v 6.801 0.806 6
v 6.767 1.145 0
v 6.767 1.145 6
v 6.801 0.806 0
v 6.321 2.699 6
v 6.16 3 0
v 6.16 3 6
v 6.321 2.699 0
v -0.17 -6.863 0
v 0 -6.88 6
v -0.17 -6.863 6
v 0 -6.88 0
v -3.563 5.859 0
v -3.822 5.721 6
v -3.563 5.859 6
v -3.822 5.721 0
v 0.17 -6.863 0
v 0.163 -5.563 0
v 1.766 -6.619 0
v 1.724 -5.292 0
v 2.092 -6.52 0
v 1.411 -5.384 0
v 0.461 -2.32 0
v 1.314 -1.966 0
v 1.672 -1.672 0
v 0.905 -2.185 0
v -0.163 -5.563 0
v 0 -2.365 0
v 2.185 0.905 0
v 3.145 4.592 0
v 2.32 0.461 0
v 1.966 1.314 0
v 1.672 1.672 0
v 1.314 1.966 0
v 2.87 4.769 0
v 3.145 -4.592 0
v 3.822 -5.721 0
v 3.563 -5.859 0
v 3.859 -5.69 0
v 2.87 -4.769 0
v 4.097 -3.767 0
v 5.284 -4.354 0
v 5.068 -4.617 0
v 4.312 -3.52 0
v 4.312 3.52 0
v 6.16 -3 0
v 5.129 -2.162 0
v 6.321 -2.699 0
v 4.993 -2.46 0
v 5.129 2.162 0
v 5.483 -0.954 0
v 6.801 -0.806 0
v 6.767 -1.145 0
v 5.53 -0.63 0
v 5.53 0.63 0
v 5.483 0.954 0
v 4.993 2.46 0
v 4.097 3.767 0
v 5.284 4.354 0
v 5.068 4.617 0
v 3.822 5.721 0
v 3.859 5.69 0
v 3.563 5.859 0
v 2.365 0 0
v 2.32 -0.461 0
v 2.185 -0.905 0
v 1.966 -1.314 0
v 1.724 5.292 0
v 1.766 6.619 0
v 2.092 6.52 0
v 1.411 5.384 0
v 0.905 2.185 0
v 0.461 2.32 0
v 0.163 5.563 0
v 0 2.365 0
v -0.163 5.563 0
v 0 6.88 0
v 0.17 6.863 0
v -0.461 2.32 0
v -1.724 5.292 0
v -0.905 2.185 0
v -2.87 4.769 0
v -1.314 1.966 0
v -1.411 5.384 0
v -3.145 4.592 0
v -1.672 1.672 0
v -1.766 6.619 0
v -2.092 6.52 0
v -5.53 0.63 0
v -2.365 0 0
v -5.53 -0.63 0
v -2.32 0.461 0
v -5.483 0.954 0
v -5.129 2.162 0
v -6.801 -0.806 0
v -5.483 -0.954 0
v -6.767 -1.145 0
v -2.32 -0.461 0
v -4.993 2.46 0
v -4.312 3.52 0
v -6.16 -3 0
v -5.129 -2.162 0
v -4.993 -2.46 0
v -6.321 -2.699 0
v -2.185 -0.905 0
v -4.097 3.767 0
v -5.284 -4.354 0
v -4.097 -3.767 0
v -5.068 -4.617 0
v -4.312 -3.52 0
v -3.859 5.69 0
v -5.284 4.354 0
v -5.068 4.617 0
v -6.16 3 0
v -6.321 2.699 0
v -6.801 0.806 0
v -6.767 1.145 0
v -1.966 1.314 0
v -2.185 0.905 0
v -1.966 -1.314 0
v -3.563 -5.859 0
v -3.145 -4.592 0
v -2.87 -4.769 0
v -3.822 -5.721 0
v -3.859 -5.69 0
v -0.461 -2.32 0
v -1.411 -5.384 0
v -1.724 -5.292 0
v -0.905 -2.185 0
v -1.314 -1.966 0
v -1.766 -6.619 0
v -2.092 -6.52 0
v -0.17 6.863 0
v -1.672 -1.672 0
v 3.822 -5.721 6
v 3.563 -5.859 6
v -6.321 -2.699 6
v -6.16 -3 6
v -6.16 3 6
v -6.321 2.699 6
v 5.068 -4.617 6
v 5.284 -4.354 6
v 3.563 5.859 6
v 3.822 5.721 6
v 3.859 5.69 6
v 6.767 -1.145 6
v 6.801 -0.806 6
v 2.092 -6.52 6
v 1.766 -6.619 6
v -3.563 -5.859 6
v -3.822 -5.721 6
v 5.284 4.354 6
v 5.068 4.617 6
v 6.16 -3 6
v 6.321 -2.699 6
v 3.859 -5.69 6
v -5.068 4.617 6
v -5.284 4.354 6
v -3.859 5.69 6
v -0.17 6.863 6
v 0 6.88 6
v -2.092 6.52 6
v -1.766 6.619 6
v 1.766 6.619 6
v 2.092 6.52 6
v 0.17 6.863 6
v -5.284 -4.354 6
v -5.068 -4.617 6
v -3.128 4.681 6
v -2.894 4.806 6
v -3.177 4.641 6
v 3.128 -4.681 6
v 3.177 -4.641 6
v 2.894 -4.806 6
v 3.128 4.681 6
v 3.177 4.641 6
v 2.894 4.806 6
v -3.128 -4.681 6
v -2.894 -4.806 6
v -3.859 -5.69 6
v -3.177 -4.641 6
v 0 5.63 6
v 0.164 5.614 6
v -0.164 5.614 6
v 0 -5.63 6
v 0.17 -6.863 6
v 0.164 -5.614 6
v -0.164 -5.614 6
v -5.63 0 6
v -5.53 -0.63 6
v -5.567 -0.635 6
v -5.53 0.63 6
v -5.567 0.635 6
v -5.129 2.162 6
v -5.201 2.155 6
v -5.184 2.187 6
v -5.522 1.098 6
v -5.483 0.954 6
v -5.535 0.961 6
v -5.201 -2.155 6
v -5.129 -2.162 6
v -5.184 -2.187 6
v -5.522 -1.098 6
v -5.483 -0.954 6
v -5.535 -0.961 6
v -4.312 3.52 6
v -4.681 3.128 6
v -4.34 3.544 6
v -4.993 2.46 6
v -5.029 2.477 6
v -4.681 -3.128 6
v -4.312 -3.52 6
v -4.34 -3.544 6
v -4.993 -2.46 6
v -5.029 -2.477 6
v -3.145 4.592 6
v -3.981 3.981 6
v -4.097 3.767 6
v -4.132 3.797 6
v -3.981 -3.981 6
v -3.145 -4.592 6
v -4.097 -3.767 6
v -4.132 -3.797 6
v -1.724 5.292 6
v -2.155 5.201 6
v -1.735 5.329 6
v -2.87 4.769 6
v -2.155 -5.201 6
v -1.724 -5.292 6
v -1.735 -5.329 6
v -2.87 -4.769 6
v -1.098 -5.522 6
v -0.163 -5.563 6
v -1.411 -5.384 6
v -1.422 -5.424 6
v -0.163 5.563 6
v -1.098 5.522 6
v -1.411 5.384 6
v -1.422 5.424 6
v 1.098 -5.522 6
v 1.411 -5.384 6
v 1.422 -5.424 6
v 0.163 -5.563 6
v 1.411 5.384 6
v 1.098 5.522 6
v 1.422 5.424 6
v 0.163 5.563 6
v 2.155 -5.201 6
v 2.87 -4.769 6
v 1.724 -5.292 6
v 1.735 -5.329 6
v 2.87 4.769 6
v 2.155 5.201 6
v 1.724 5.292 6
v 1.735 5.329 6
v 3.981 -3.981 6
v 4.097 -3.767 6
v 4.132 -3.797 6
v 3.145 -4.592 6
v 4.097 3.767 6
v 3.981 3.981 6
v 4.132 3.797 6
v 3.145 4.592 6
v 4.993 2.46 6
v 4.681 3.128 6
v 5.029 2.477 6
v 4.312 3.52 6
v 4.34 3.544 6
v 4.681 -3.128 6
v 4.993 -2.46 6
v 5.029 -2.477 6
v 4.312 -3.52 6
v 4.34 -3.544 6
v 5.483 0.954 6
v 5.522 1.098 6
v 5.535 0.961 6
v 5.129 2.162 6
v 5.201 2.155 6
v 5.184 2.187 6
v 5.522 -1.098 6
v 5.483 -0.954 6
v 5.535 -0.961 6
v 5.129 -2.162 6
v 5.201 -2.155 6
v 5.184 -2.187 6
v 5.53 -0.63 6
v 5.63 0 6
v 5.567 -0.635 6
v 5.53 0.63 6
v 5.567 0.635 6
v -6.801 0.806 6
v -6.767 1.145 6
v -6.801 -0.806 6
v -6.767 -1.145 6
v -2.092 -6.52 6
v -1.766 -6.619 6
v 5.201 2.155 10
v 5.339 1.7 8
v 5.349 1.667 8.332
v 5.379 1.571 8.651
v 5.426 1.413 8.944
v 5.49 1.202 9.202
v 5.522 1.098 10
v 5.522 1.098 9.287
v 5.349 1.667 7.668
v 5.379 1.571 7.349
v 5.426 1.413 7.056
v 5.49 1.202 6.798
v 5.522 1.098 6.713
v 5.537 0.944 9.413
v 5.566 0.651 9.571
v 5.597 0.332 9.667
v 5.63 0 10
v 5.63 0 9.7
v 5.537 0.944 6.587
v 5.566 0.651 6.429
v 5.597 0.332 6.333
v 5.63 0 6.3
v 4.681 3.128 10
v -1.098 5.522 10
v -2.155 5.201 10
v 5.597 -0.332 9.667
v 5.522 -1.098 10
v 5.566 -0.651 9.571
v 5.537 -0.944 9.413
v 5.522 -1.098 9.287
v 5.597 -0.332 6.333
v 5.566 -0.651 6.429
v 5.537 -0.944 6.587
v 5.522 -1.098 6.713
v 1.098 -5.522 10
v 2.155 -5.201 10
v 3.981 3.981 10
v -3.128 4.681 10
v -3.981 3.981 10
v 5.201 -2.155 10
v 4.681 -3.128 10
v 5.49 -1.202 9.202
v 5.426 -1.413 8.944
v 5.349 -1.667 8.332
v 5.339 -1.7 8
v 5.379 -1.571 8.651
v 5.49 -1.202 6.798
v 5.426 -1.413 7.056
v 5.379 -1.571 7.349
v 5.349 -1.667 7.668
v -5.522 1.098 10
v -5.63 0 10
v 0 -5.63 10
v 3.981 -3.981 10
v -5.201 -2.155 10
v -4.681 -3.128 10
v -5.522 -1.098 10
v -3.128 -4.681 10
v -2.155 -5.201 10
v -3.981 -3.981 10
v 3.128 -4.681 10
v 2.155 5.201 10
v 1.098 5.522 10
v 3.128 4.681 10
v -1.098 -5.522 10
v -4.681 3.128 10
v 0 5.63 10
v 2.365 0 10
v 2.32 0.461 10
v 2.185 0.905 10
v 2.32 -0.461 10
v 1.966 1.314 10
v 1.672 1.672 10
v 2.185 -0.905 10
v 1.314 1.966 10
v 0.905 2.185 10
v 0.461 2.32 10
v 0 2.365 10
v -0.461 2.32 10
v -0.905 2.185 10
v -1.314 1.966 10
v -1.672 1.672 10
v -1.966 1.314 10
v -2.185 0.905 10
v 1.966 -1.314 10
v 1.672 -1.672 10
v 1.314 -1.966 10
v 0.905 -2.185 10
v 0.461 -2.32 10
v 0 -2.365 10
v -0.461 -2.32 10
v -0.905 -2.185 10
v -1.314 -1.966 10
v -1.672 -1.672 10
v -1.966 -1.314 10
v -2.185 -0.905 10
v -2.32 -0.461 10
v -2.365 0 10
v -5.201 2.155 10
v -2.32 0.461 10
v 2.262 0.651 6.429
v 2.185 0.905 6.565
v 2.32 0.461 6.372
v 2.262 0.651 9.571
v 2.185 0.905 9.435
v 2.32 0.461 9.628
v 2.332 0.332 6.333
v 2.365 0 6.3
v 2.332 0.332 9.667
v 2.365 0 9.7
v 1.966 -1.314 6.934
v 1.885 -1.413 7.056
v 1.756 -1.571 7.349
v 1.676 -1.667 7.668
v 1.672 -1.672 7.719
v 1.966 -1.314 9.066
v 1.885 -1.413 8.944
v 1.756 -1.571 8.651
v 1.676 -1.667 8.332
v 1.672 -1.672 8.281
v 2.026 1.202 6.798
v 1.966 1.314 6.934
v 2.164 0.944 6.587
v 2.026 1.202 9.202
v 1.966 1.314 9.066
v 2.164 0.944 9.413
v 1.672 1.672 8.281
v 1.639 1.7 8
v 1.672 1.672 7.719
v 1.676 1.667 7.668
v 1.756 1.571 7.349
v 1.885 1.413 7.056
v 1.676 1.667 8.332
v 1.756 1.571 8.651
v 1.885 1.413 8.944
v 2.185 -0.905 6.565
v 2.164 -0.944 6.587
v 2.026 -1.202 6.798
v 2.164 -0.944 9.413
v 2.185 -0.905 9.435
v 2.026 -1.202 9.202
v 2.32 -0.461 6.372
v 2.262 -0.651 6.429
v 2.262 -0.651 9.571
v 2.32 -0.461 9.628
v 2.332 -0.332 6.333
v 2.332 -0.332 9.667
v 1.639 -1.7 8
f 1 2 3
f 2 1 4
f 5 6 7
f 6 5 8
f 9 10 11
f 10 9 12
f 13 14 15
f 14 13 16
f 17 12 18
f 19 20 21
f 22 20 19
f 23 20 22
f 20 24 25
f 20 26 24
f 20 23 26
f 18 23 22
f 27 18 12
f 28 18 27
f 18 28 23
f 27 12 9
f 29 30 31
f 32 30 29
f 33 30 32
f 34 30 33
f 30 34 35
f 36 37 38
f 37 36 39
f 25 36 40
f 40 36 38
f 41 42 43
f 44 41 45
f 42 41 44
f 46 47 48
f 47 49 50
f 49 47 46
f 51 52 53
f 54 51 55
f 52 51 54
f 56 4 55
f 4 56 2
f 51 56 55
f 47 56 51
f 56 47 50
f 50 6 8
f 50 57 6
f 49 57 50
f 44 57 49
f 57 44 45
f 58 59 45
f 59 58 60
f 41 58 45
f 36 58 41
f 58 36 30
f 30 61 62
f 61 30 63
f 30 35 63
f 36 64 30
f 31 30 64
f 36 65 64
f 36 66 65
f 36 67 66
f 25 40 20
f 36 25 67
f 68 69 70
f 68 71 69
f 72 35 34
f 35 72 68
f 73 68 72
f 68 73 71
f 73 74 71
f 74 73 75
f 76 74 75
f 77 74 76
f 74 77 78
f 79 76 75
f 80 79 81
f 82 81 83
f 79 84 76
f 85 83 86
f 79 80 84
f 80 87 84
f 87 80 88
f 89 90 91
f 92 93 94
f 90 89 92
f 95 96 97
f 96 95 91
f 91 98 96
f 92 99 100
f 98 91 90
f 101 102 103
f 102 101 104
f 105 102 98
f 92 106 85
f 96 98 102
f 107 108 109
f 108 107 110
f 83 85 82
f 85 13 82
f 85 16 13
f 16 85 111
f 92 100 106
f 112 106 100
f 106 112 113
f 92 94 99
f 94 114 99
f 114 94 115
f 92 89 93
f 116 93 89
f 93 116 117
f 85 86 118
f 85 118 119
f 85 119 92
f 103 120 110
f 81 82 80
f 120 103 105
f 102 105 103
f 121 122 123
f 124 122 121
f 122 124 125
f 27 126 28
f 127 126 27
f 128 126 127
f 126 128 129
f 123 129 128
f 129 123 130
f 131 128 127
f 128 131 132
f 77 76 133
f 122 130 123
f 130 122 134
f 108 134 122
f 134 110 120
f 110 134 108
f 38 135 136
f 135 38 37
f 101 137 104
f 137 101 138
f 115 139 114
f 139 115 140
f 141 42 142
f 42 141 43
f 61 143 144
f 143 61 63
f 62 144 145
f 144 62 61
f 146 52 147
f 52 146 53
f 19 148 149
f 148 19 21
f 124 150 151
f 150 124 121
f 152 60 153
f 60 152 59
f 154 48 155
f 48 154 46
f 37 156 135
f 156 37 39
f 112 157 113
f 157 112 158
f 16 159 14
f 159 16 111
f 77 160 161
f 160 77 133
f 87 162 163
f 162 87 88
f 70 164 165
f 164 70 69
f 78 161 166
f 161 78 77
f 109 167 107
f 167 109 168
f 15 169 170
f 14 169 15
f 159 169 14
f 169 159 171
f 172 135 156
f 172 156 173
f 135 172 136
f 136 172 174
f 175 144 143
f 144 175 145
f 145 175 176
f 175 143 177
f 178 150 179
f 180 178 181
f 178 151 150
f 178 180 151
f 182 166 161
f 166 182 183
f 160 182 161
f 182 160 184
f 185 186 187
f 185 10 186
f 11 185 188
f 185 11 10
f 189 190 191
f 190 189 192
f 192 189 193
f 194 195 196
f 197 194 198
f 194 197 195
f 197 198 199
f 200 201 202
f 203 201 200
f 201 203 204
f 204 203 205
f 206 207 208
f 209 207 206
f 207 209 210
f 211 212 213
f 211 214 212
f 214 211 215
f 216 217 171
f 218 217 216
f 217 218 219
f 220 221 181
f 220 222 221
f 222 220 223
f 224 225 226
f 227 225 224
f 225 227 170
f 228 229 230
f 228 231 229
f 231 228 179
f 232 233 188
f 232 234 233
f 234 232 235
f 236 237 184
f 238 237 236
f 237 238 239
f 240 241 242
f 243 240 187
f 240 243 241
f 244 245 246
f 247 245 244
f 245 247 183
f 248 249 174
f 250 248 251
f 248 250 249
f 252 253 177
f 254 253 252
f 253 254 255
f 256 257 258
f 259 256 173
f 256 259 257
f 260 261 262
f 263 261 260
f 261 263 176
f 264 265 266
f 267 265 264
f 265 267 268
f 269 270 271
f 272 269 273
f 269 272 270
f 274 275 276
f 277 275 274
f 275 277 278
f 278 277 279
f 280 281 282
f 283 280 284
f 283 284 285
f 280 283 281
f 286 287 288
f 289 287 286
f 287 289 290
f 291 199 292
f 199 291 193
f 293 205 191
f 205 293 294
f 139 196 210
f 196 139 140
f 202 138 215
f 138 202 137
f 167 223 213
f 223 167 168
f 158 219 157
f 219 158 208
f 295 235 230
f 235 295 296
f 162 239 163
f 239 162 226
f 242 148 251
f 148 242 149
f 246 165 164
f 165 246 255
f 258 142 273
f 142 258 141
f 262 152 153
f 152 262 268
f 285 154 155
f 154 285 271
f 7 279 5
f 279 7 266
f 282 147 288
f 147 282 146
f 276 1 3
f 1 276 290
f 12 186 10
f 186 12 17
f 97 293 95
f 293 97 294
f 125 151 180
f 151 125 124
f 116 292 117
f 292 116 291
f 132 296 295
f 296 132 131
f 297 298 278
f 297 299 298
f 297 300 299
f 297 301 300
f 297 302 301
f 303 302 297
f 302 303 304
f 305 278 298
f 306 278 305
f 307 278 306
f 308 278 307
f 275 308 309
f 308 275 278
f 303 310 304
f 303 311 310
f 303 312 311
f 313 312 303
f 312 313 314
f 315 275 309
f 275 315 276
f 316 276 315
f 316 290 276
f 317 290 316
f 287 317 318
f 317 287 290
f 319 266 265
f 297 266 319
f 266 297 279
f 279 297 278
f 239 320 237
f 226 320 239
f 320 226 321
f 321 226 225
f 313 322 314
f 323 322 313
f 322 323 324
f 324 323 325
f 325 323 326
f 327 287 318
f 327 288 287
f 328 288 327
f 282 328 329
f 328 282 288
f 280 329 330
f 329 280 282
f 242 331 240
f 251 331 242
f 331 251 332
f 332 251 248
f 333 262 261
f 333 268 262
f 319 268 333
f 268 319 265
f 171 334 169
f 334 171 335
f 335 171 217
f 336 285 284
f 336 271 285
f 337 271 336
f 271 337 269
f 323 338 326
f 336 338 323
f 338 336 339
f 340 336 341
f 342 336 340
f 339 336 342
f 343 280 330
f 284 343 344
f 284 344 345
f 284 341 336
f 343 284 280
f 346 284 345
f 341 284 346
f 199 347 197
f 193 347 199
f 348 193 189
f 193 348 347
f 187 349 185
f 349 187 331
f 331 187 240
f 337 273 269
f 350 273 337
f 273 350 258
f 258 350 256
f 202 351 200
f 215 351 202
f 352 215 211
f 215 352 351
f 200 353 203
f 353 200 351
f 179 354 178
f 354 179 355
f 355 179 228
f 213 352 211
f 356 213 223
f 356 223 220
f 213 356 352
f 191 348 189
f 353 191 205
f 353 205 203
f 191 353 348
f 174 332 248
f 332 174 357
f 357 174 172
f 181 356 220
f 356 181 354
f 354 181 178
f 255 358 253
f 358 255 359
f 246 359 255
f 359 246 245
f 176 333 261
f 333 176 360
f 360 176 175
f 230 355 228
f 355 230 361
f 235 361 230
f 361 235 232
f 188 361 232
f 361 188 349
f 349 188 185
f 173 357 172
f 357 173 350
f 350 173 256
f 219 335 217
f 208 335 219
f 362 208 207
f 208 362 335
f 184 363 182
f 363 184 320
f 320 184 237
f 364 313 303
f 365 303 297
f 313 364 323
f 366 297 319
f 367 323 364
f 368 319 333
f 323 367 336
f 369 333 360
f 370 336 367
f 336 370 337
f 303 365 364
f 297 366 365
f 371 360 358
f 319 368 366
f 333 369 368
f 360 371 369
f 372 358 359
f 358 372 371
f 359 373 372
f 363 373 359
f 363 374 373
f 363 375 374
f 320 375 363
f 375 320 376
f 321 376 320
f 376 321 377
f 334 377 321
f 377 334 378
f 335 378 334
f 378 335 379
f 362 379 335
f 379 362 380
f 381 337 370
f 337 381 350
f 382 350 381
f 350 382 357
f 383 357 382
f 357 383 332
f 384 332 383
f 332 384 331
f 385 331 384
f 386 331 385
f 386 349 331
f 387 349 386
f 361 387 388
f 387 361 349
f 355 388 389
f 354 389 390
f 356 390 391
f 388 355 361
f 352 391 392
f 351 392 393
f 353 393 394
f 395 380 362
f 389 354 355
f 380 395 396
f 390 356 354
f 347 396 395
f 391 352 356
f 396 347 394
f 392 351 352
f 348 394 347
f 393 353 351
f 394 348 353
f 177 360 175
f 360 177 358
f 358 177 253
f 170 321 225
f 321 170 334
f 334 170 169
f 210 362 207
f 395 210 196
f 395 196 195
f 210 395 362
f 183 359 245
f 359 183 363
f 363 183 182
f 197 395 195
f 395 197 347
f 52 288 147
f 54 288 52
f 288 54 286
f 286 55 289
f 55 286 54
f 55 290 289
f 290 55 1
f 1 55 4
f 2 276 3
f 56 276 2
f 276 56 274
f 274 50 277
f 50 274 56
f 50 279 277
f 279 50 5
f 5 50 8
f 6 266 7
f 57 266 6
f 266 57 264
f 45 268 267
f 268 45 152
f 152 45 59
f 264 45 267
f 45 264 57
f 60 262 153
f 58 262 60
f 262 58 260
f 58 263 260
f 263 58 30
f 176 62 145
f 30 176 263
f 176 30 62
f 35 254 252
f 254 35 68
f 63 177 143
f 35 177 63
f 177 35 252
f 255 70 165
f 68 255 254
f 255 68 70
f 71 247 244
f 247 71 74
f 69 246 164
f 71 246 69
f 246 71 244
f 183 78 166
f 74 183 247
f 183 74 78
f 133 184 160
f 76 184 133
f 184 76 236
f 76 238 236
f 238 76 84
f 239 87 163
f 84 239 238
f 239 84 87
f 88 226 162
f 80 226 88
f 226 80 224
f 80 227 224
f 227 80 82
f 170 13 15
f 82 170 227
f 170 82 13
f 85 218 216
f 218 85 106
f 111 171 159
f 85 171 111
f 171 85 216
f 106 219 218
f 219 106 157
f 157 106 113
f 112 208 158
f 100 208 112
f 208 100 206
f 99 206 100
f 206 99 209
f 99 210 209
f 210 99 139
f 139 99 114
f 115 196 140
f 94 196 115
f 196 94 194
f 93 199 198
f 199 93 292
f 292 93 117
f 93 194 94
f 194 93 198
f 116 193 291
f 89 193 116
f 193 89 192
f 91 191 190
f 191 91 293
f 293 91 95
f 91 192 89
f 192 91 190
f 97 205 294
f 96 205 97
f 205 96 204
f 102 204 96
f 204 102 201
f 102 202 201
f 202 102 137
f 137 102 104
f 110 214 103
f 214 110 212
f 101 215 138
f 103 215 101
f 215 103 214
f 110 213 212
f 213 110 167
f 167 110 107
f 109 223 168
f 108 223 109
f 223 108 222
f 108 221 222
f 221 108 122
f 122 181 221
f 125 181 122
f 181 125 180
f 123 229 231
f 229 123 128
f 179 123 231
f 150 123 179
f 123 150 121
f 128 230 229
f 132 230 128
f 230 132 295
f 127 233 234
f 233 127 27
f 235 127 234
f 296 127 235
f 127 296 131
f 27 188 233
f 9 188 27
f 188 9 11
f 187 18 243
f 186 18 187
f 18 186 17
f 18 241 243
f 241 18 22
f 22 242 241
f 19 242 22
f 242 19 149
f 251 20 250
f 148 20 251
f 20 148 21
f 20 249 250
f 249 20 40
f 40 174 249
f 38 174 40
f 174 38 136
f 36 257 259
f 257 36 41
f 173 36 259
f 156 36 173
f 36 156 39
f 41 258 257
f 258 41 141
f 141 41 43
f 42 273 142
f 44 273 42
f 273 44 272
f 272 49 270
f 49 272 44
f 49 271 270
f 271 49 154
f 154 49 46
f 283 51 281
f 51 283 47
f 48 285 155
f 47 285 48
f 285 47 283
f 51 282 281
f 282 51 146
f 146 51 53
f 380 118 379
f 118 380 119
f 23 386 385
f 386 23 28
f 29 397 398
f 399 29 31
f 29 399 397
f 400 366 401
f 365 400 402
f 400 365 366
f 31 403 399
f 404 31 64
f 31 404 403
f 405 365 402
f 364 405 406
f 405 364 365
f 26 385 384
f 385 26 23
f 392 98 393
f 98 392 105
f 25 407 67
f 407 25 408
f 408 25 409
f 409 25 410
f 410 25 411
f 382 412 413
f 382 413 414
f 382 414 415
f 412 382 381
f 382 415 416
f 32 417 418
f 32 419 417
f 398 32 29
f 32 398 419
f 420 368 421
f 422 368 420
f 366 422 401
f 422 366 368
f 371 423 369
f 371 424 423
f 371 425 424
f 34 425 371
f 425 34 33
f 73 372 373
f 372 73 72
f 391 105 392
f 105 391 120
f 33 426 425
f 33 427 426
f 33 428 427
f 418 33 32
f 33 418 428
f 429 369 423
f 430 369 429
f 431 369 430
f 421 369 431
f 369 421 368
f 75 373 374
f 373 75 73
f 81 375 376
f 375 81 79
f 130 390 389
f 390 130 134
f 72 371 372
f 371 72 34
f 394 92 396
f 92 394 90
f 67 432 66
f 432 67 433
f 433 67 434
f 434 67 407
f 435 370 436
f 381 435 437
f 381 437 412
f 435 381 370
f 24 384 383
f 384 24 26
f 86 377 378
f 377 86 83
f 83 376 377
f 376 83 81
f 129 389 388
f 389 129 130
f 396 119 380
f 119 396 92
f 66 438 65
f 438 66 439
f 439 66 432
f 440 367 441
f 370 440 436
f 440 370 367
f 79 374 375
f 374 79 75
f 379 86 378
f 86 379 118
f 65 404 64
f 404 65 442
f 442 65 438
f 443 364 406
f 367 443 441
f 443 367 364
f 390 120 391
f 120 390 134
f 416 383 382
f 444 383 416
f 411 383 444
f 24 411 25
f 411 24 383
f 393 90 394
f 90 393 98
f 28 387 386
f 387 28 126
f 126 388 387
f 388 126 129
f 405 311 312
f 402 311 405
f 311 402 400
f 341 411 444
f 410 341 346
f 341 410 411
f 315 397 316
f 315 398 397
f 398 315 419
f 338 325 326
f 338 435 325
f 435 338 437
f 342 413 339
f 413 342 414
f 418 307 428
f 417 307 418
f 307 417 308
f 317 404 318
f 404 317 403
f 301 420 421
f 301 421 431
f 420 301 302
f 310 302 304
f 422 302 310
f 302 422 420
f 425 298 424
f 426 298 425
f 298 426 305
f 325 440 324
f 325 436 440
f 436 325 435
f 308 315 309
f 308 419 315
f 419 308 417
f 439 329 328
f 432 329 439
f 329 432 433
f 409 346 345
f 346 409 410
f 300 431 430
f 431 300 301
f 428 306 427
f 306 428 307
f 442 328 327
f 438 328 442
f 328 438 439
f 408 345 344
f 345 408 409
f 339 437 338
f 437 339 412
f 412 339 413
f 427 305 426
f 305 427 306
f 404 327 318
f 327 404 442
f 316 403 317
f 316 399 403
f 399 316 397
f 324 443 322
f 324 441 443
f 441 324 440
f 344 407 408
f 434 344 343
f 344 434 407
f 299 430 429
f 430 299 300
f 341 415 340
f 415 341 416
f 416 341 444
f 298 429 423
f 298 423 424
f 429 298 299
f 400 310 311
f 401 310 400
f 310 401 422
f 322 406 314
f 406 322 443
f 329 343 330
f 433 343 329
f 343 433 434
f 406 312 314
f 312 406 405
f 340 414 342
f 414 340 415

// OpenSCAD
$fn = 32;

// ----------------------------------------------------------------------
// Timing pulley: GT2 22T, pitch 2 mm, 13.76 mm x 10 mm
// ----------------------------------------------------------------------

// --- parameters (mm) ---
pitch_mm = 2;             // belt pitch
tooth_count = 22;         // number of grooves
width = 6;                // belt width between the flanges
tip_d = 13.76;            // tip circle diameter
root_d = 12.26;           // groove bottom diameter
groove_h = 0.75;          // groove depth
tooth_w = 1.5;            // groove width at the tip circle
hub_bore = 4.73;          // shaft bore
hub_d = 11.26;            // hub diameter
hub_h = 4;                // hub above the flange
bottom_z = 0;             // lowest point of the pulley
top_z = 10;               // highest point of the pulley
set_d = 3.4;              // set screw tap hole

module rim() {
  cylinder(h = width, d = tip_d);
}

module groove_cutter() {
  /* belt tooth groove: deeper than wide, cut through the belt width */
  translate([root_d / 2, 0, 0])
    linear_extrude(height = width)
      polygon(points = [[-0.6, -tooth_w * 0.42], [groove_h + 0.6, -tooth_w * 0.6],
                        [groove_h + 0.6, tooth_w * 0.6], [-0.6, tooth_w * 0.42]]);
}

module hub() {
  translate([0, 0, bottom_z]) cylinder(h = top_z - bottom_z, d = hub_d);
}

difference() {
  union() {
    rim();
    hub();
  }
  for (i = [0 : tooth_count - 1]) rotate([0, 0, i * 360 / tooth_count]) groove_cutter();
  translate([0, 0, bottom_z - 1]) cylinder(h = top_z - bottom_z + 2, d = hub_bore);
  translate([-1, 0, top_z - hub_h * 0.5]) rotate([0, 90, 0]) cylinder(h = hub_d / 2 + 3, d = set_d);
}
